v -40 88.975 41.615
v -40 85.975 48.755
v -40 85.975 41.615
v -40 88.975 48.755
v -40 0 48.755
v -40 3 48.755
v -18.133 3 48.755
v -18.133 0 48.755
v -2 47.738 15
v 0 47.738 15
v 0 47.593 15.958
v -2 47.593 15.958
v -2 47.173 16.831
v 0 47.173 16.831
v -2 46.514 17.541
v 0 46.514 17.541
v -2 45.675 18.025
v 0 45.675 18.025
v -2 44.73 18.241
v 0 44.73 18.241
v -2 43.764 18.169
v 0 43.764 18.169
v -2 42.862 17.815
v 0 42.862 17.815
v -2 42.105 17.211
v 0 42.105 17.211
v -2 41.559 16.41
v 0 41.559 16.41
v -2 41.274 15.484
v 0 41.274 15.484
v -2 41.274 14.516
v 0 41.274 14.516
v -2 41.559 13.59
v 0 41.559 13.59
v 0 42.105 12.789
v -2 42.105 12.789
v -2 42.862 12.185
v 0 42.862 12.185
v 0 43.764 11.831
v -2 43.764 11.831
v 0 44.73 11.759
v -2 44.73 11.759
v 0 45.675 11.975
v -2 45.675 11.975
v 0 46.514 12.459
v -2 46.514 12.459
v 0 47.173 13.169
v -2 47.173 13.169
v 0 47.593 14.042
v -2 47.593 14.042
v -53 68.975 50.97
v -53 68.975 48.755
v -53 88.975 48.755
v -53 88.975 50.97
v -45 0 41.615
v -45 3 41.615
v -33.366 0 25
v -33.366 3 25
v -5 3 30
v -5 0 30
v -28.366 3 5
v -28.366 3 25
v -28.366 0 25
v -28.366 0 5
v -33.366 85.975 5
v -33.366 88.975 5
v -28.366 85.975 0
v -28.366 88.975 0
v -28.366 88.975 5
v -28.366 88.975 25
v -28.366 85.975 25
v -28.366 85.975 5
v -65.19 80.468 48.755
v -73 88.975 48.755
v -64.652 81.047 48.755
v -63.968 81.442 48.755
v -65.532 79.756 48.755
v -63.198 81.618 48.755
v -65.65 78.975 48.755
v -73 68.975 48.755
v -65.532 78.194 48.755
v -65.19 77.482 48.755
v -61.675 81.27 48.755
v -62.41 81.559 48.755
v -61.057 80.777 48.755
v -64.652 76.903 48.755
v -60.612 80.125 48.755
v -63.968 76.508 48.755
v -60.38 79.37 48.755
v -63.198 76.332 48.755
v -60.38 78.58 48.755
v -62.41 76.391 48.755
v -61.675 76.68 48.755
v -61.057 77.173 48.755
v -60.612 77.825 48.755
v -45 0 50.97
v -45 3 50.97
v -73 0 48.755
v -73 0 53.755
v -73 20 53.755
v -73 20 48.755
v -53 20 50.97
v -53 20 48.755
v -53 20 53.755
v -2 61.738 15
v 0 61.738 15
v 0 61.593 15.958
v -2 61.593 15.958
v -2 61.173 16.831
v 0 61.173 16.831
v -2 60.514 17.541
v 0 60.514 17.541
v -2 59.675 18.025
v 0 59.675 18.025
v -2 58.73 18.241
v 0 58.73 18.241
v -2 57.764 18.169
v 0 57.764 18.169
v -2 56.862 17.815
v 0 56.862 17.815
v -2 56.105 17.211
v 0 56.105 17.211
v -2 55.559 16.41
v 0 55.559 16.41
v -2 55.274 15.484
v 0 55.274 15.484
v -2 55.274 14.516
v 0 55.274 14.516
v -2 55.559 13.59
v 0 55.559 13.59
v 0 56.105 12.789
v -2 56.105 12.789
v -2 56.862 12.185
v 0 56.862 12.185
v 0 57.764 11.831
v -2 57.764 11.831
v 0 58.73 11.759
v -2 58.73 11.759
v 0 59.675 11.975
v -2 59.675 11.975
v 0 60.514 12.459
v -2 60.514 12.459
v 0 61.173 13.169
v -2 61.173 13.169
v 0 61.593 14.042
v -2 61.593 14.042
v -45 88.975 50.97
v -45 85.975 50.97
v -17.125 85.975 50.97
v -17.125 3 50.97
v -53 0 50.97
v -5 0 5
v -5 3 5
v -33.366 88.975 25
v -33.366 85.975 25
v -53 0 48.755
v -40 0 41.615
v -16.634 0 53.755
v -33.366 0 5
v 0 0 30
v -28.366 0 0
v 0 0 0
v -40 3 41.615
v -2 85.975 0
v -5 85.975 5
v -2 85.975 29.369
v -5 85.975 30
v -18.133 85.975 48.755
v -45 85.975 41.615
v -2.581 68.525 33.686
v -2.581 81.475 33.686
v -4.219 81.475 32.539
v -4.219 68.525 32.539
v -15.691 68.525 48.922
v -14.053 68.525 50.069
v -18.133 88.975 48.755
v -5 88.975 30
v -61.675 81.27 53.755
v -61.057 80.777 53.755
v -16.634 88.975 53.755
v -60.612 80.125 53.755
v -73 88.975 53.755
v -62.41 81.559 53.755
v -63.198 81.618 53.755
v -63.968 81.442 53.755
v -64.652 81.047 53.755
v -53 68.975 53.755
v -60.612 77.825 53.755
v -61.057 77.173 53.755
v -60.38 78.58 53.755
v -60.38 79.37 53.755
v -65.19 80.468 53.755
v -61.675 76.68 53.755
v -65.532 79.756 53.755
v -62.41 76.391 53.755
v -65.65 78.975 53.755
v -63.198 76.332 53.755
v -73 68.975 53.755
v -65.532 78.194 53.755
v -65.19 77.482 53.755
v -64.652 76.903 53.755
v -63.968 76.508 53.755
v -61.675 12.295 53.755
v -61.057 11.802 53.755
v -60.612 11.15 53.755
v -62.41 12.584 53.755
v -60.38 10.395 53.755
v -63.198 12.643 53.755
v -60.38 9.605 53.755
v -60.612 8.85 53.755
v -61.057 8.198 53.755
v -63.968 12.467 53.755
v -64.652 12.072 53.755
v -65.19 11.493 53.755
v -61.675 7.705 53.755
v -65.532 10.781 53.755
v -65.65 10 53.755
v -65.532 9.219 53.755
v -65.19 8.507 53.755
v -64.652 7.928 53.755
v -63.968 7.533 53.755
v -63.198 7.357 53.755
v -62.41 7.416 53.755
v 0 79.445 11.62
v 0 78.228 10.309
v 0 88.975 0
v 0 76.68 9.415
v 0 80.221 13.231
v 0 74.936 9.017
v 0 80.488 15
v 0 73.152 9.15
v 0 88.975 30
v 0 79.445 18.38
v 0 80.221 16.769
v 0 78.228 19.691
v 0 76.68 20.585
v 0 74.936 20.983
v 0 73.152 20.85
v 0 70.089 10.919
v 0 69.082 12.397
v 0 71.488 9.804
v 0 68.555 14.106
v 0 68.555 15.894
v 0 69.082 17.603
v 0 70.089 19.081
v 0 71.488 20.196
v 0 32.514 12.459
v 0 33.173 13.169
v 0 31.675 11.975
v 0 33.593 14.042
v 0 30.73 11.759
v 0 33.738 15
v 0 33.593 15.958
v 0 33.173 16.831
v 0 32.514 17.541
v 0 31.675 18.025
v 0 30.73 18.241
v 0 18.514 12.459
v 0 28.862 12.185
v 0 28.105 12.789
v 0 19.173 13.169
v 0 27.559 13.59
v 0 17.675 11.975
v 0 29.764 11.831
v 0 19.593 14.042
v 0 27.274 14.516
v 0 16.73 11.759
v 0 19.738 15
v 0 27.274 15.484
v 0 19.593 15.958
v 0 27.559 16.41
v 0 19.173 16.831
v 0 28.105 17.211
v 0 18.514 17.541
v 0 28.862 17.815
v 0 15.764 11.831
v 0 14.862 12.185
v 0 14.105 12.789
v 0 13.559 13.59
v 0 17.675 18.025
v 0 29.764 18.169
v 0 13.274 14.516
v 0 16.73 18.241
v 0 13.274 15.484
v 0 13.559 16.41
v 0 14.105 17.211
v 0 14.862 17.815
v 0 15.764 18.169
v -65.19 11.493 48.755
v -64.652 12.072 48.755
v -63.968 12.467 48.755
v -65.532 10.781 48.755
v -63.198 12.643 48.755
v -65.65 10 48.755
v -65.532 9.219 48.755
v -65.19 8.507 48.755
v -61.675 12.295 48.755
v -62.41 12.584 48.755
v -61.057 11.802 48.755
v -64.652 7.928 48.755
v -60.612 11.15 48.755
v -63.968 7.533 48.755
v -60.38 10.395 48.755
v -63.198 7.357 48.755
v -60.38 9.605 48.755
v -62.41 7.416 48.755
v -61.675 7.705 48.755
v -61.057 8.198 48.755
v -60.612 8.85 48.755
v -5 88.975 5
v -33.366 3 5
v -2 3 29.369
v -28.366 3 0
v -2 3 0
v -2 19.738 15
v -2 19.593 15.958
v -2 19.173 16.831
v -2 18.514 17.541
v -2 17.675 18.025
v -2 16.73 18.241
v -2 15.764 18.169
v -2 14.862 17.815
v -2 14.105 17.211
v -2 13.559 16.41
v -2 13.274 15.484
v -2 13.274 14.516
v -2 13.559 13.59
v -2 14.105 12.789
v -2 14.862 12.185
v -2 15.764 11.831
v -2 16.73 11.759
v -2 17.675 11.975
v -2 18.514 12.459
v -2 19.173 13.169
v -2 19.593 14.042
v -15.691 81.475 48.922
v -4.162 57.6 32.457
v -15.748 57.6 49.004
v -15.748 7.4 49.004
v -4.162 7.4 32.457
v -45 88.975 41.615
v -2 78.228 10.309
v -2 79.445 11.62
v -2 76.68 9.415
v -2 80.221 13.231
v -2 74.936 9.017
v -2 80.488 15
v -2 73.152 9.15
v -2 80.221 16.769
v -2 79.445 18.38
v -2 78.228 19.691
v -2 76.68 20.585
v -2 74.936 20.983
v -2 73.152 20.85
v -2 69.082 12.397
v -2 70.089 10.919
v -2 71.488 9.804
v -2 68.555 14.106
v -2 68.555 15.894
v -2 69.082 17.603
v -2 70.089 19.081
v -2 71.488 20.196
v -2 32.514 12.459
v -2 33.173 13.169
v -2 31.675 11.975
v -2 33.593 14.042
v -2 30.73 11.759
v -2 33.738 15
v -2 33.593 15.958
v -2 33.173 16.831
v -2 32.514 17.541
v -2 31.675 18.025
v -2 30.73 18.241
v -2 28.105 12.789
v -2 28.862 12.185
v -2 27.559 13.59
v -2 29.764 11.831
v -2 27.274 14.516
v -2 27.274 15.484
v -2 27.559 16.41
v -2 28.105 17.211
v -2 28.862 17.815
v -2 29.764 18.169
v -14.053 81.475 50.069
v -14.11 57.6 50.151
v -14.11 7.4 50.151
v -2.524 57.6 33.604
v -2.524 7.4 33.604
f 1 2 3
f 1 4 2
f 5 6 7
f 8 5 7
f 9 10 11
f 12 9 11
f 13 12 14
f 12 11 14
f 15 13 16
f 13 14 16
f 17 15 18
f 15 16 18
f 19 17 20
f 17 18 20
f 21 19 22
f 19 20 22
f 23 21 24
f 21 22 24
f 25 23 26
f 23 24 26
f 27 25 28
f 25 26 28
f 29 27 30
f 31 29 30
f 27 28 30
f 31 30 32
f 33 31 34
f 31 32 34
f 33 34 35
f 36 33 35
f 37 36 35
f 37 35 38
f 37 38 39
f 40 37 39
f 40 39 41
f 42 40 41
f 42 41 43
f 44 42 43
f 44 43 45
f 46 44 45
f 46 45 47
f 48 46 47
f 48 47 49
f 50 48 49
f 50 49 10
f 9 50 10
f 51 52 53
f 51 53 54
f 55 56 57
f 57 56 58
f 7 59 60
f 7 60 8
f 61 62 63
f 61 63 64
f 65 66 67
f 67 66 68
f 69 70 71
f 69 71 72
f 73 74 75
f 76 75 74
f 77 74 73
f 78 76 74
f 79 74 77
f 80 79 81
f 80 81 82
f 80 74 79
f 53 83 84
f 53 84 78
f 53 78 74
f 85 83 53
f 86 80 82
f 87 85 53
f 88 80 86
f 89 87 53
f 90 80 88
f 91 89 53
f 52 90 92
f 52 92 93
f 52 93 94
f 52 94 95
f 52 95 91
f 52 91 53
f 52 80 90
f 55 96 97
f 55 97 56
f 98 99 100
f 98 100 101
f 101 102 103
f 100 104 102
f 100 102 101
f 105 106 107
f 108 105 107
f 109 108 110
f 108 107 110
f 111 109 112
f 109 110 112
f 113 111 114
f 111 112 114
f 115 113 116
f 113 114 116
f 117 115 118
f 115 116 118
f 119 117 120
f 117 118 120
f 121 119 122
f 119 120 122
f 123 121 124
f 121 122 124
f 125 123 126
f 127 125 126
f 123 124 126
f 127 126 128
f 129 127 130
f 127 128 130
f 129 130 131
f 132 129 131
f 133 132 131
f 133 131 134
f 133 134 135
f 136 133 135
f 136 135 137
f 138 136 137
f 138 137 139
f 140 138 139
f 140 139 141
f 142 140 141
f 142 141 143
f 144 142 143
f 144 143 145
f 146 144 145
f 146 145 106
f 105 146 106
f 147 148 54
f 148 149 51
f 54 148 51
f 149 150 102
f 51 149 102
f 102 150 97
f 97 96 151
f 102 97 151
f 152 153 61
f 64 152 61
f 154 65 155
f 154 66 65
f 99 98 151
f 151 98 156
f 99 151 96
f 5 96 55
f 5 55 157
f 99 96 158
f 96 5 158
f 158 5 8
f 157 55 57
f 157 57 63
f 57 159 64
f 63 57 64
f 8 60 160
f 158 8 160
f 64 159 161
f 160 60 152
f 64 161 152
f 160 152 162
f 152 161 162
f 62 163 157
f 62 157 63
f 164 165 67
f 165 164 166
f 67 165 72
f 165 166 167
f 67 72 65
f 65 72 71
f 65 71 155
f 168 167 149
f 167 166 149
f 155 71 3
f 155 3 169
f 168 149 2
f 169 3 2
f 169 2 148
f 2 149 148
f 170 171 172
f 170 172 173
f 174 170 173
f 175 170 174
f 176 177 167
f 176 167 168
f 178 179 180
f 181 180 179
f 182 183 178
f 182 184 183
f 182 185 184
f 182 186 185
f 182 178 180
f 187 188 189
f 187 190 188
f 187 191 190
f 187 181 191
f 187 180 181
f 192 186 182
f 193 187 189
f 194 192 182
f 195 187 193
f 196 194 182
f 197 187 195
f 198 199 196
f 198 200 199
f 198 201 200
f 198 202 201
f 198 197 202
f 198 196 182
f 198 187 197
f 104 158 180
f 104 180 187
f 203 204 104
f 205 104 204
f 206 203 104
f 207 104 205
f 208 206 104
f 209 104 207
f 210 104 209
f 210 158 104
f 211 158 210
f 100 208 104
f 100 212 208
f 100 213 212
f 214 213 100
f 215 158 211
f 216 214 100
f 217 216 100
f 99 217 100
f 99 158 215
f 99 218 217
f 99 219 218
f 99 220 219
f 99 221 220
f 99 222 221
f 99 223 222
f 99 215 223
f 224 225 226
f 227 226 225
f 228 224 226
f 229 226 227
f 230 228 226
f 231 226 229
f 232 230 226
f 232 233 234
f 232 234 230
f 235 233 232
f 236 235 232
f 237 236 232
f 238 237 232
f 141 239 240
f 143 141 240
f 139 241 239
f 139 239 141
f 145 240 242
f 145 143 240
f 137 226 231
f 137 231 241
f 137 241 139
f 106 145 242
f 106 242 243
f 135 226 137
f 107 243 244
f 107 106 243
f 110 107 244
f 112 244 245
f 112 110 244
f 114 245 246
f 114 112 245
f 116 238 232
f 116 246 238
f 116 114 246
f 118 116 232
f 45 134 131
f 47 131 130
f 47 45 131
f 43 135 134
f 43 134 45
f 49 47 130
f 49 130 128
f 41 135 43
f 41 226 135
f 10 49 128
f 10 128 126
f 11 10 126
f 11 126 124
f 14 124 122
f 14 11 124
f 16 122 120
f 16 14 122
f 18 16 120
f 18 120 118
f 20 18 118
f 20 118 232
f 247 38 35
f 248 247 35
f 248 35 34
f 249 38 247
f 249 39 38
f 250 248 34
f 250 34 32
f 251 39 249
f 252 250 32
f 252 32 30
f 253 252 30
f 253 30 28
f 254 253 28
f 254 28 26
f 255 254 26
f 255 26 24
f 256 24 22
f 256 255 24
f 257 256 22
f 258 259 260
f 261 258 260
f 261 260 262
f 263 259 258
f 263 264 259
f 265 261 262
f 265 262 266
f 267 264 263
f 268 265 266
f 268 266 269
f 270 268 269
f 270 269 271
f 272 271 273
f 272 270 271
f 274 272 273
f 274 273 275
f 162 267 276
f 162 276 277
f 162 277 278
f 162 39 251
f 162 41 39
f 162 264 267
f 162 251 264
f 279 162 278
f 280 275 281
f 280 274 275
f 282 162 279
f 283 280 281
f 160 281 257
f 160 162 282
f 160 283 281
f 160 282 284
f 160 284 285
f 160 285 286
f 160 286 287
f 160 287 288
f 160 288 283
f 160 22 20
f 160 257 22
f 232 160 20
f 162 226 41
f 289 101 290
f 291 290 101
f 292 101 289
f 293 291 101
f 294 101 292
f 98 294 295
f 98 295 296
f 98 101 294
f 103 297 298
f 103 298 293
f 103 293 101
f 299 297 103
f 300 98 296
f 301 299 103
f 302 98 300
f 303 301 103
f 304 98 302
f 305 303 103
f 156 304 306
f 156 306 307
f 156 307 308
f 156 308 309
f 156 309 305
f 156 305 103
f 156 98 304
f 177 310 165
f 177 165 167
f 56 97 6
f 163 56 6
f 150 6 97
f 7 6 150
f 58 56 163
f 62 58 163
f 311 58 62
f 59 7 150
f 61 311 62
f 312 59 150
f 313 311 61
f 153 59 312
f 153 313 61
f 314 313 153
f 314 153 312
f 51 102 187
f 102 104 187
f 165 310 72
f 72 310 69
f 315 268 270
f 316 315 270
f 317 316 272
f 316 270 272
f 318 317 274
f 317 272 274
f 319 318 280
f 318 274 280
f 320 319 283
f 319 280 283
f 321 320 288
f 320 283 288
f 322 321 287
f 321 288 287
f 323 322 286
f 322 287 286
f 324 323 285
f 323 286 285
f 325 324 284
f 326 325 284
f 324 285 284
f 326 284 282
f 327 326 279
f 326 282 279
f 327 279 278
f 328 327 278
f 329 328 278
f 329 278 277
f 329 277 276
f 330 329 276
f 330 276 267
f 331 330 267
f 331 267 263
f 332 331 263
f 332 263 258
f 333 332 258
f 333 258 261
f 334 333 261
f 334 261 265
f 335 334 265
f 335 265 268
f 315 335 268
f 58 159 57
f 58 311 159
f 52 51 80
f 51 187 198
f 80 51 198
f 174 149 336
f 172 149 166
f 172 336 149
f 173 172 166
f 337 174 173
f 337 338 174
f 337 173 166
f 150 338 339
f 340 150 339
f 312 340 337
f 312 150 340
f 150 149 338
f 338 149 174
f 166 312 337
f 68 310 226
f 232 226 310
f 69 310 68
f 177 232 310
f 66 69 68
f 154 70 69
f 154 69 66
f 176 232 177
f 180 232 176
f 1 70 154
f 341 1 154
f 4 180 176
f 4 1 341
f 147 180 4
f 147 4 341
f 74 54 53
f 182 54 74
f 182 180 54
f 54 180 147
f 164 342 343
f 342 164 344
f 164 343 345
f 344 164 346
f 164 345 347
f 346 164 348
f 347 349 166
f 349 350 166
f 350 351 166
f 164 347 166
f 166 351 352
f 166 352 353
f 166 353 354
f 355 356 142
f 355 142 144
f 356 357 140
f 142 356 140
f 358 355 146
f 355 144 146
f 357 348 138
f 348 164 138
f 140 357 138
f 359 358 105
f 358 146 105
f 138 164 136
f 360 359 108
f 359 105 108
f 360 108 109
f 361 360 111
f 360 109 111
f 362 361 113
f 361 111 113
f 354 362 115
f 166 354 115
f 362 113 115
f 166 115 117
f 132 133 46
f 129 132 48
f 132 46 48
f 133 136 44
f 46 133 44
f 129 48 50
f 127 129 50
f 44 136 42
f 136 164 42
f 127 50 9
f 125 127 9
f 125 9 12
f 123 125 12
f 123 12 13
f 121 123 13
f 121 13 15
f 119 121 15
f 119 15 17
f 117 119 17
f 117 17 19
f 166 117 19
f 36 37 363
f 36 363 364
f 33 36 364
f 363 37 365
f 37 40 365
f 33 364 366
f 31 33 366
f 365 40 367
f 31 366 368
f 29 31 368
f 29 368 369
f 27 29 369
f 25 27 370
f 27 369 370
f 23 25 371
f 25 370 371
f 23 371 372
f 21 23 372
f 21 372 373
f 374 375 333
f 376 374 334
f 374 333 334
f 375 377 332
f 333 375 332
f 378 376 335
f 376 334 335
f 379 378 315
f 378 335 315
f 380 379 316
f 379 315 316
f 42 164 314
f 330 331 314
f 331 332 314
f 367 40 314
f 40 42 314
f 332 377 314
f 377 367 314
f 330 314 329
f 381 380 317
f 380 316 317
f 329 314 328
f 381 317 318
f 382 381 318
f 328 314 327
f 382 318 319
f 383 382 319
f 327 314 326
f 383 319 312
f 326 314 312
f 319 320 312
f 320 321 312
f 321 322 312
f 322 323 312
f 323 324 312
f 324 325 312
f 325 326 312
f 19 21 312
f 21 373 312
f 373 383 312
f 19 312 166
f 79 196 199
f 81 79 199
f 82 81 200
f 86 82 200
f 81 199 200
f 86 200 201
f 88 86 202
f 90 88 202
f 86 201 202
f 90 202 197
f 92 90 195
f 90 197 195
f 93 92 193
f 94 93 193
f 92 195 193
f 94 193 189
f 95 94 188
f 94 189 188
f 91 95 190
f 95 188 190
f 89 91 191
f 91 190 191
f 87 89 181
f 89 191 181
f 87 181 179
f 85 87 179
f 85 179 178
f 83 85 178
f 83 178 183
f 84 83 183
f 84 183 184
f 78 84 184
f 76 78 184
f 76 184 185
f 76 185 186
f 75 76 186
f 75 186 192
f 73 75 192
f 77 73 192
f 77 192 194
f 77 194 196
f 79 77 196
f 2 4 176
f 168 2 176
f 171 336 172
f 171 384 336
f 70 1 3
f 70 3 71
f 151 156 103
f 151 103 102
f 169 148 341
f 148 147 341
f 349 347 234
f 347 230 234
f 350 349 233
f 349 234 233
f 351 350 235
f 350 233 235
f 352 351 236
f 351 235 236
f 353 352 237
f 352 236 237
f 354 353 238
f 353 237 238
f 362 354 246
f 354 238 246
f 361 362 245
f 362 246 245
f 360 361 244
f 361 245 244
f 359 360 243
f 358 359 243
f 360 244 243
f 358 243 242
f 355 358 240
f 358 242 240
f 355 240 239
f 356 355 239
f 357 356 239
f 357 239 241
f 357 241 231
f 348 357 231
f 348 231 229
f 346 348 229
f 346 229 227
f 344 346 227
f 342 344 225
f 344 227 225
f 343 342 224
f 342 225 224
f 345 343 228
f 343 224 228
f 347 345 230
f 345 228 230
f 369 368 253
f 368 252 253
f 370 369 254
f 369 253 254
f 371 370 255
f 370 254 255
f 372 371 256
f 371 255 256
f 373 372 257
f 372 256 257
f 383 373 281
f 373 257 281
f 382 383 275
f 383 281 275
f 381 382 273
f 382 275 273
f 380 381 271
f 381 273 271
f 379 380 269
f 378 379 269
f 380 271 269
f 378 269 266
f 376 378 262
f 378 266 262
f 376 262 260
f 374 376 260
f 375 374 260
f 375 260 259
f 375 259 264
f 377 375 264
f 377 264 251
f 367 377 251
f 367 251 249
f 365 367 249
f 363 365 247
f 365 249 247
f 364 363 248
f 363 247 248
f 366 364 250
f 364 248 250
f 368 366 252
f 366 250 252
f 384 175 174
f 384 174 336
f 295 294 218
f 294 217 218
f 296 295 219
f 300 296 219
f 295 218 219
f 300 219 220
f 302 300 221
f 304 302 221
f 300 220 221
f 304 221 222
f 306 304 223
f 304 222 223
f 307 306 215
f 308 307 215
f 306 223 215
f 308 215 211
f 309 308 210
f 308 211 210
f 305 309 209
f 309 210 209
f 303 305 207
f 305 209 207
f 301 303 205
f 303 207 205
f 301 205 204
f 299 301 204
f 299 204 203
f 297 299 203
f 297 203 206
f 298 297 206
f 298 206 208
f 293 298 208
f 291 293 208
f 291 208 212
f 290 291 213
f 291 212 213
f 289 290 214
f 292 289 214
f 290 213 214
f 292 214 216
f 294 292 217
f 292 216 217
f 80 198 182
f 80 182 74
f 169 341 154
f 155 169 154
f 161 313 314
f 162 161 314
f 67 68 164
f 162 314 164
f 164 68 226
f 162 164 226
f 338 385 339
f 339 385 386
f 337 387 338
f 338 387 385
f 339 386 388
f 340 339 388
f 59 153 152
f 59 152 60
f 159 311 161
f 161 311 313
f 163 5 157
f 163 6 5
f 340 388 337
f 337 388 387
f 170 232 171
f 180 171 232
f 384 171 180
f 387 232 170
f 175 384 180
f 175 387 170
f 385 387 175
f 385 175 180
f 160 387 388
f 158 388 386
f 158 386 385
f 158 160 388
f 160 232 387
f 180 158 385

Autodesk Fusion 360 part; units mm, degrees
sketch "스케치1" plane through (0, 0, 0) normal (0, 1, 0) x (1, 0, 0)
  line L0 (0, 0) -> (0, -30)
  line L1 (0, -30) -> (-16.6337, -53.7554)
  line L2 (0, -30) -> (29, -30) construction
  line L3 (0, 0) -> (-2, 0)
  line L4 (-16.6337, -53.7554) -> (-18.272, -52.6083)
  line L5 (-18.272, -52.6083) -> (-2, -29.3694)
  line L6 (-2, 0) -> (-2, -29.3694)
  line L7 (0, 0) -> (-73, 0)
  line L8 (-16.6337, -53.7554) -> (-73, -53.7554)
  line L9 (-18.272, -52.6083) -> (-17.1249, -50.97)
  line L10 (-73, -53.7554) -> (-73, -48.7554)
  line L11 (-73, -48.7554) -> (-53, -48.7554)
  line L12 (-53, -48.7554) -> (-53, -53.7554)
  line L13 (-17.1249, -50.97) -> (-53, -50.97)
  line L14 (-53, -50.97) -> (-45, -50.97)
  line L15 (-45, -50.97) -> (-45, 0)
  dimension "d1" = 30
  dimension "d2" = 125
  dimension "d3" = 29
  dimension "d4" = 2
  dimension "d7" = 73
  dimension "d8" = 2
  dimension "d9" = 5
  dimension "d10" = 20
  dimension "d11" = 8
extrude "돌출1" add sketch "스케치1" along normal blind 88.975 contours L0 L1 L3 L4 L5 L6 L7 L9 | L4 L5 L8 L9 L12 L13 L14 | L8 L10 L11 L12
extrude "돌출2" add sketch "스케치1" along normal blind 3 contours L5 L6 L7 L13 L15
sketch "스케치2" plane through (0, 88.975, 0) normal (0, 1, 0) x (-1, 0, 0)
  line L0 (0, 0) -> (2, 0)
  line L1 (2, 0) -> (2, 29.3694)
  line L2 (2, 29.3694) -> (17.1249, 50.97)
  line L3 (17.1249, 50.97) -> (53, 50.97)
  line L4 (53, 50.97) -> (53, 48.7554)
  line L5 (53, 48.7554) -> (73, 48.7554)
  line L6 (73, 48.7554) -> (73, 53.7554)
  line L7 (73, 53.7554) -> (16.6337, 53.7554)
  line L8 (16.6337, 53.7554) -> (0, 30)
  line L9 (0, 30) -> (0, 0)
  line L10 (53, 50.97) -> (45, 50.97)
  line L11 (45, 50.97) -> (45, 0)
  line L12 (45, 0) -> (2, 0)
  dimension "d14" = 8
extrude "돌출3" add sketch "스케치2" against normal blind 3 contours L1 L2 L3 L11 L12
sketch "스케치3" plane through (0, 0, 0) normal (1, 0, 0) x (0, 1, 0)
  line L0 (0, 30) -> (0, 0)
  line L1 (0, 0) -> (88.975, 0)
  line L2 (88.975, 0) -> (88.975, 30)
  line L3 (88.975, 30) -> (0, 30)
  line L4 (86.4875, 30) -> (2.4875, 30)
  line L5 (2.4875, 30) -> (2.4875, 0)
  line L6 (2.4875, 0) -> (86.4875, 0)
  line L7 (86.4875, 0) -> (86.4875, 30)
  line L8 (86.4875, 30) -> (2.4875, 0) construction
  line L9 (2.4875, 30) -> (86.4875, 0) construction
  line L10 (2.4875, 15) -> (16.4875, 15)
  line L11 (16.4875, 15) -> (30.4875, 15)
  line L12 (30.4875, 15) -> (44.4875, 15)
  line L13 (44.4875, 15) -> (58.4875, 15)
  line L14 (58.4875, 15) -> (74.4875, 15)
  line L15 (74.4875, 15) -> (86.4875, 15)
  circle A0 centre (16.4875, 15) radius 3.25
  circle A1 centre (30.4875, 15) radius 3.25
  circle A2 centre (44.4875, 15) radius 3.25
  circle A3 centre (58.4875, 15) radius 3.25
  circle A4 centre (74.4875, 15) radius 6
  circle A5 centre (16.4875, 15) radius 6
  point P0 (44.4875, 15)
  dimension "d45" = 84
  dimension "d46" = 14
  dimension "d47" = 14
  dimension "d48" = 14
  dimension "d49" = 14
  dimension "d50" = 16
  dimension "d51" = 6.5
  dimension "d52" = 6.5
  dimension "d53" = 6.5
  dimension "d54" = 6.5
  dimension "d55" = 12
  dimension "d56" = 12
extrude "돌출4" cut sketch "스케치3" against normal blind 3 contours L14 L15 A4 | L14 L15 A4 | L10 L11 A0 | L10 L11 A0 | L11 L12 A1 | L11 L12 A1 | L13 L14 A3 | L13 L14 A3 | L12 L13 A2 | L12 L13 A2
sketch "스케치4" plane through (14.0954, 0, 9.8697) normal (0.8192, 0, 0.5736) x (0, 1, 0)
  line L0 (0, 53.5746) -> (0, 24.5746)
  line L1 (0, 24.5746) -> (88.975, 24.5746)
  line L2 (88.975, 24.5746) -> (88.975, 53.5746)
  line L3 (88.975, 53.5746) -> (0, 53.5746)
  line L4 (0, 39.0746) -> (32.5, 39.0746)
  line L5 (7.4, 28.9746) -> (57.6, 28.9746)
  line L6 (57.6, 28.9746) -> (57.6, 49.1746)
  line L7 (57.6, 49.1746) -> (7.4, 49.1746)
  line L8 (7.4, 49.1746) -> (7.4, 28.9746)
  line L9 (7.4, 28.9746) -> (57.6, 49.1746) construction
  line L10 (57.6, 28.9746) -> (7.4, 49.1746) construction
  line L11 (88.975, 39.0746) -> (75, 39.0746)
  line L12 (68.525, 49.0746) -> (81.475, 49.0746)
  line L13 (81.475, 49.0746) -> (81.475, 29.0746)
  line L14 (81.475, 29.0746) -> (68.525, 29.0746)
  line L15 (68.525, 29.0746) -> (68.525, 49.0746)
  line L16 (68.525, 49.0746) -> (81.475, 29.0746) construction
  line L17 (81.475, 49.0746) -> (68.525, 29.0746) construction
  point P0 (32.5, 39.0746)
  point P1 (75, 39.0746)
  dimension "d37" = 32.5
  dimension "d38" = 50.2
  dimension "d39" = 20.2
  dimension "d40" = 13.975
  dimension "d41" = 12.95
  dimension "d42" = 20
extrude "돌출5" cut sketch "스케치4" against normal blind 3 contours L5 L6 L7 L8 | L12 L13 L14 L15
sketch "스케치5" plane through (0, 88.975, 0) normal (0, 1, 0) x (-1, 0, 0)
  line L0 (0, 0) -> (45, 0)
  line L1 (45, 0) -> (45, 50.97)
  line L2 (45, 50.97) -> (53, 50.97)
  line L3 (53, 50.97) -> (53, 48.7554)
  line L4 (53, 48.7554) -> (73, 48.7554)
  line L5 (73, 48.7554) -> (73, 53.7554)
  line L6 (73, 53.7554) -> (16.6337, 53.7554)
  line L7 (16.6337, 53.7554) -> (0, 30)
  line L8 (0, 30) -> (0, 0)
  line L9 (0, 30) -> (5, 30)
  line L10 (5, 0) -> (5, 5)
  line L11 (5, 5) -> (5, 30)
  line L12 (5, 5) -> (40, 5)
  line L13 (5, 30) -> (21.6337, 53.7554)
  line L14 (5, 30) -> (5, 25)
  line L15 (5, 25) -> (45, 25)
  line L16 (45, 53.7554) -> (45, 48.7554)
  line L17 (45, 48.7554) -> (28.3663, 25)
  line L18 (28.3663, 25) -> (28.3663, 0)
  line L19 (28.3663, 5) -> (33.3663, 5)
  line L20 (33.3663, 5) -> (33.3663, 0)
  line L21 (33.3663, 5) -> (33.3663, 25)
  line L22 (45, 48.7554) -> (50, 48.7554)
  line L23 (50, 48.7554) -> (33.3663, 25)
  line L24 (45, 48.7554) -> (18.1327, 48.7554)
  line L25 (45, 53.7554) -> (40, 53.7554)
  line L26 (40, 53.7554) -> (40, 34.4739)
  line L27 (40, 34.4739) -> (45, 34.4739)
  line L28 (45, 34.4739) -> (45, 53.7554)
  line L29 (33.3663, 5) -> (28.3663, 0)
  dimension "d57" = 5
  dimension "d58" = 5
  dimension "d59" = 35
  dimension "d60" = 29
  dimension "d61" = 5
  dimension "d62" = 5
  dimension "d63" = 29
  dimension "d64" = 5
  dimension "d65" = 5
  dimension "d66" = 5
extrude "돌출6" cut sketch "스케치5" against normal blind 88.975 contours L0 L20 L29 | L11 L12 L15 L18 | L11 L13 L14 L15 L17 L24 L26 | L0 L1 L15 L20 L21 | L1 L15 L23 L27 | L1 L23 L27 L28
sketch "스케치6" plane through (0, 0, 53.7554) normal (0, 0, 1) x (-1, 0, 0)
  line L0 (73, 0) -> (16.6337, 0)
  line L1 (16.6337, 0) -> (16.6337, -88.975)
  line L2 (16.6337, -88.975) -> (73, -88.975)
  line L3 (73, -88.975) -> (73, 0)
  line L4 (73, 0) -> (53, 0)
  line L5 (53, 0) -> (53, -88.975)
  line L6 (53, -88.975) -> (73, -88.975)
  line L7 (73, -88.975) -> (73, 0)
  line L8 (73, 0) -> (53, 0)
  line L9 (53, 0) -> (53, -20)
  line L10 (53, -20) -> (73, -20)
  line L11 (73, -20) -> (73, 0)
  line L12 (73, -88.975) -> (53, -88.975)
  line L13 (53, -88.975) -> (53, -68.975)
  line L14 (53, -68.975) -> (73, -68.975)
  line L15 (73, -68.975) -> (73, -88.975)
  circle A0 centre (63, -10) radius 2.65
  circle A1 centre (63, -78.975) radius 2.65
  dimension "d69" = 20
  dimension "d70" = 20
  dimension "d71" = 20
  dimension "d72" = 5.3
  dimension "d73" = 5.3
extrude "돌출7" cut sketch "스케치6" against normal blind 5 contours L3 L5 L7 L10 L14 | A0 | A1
